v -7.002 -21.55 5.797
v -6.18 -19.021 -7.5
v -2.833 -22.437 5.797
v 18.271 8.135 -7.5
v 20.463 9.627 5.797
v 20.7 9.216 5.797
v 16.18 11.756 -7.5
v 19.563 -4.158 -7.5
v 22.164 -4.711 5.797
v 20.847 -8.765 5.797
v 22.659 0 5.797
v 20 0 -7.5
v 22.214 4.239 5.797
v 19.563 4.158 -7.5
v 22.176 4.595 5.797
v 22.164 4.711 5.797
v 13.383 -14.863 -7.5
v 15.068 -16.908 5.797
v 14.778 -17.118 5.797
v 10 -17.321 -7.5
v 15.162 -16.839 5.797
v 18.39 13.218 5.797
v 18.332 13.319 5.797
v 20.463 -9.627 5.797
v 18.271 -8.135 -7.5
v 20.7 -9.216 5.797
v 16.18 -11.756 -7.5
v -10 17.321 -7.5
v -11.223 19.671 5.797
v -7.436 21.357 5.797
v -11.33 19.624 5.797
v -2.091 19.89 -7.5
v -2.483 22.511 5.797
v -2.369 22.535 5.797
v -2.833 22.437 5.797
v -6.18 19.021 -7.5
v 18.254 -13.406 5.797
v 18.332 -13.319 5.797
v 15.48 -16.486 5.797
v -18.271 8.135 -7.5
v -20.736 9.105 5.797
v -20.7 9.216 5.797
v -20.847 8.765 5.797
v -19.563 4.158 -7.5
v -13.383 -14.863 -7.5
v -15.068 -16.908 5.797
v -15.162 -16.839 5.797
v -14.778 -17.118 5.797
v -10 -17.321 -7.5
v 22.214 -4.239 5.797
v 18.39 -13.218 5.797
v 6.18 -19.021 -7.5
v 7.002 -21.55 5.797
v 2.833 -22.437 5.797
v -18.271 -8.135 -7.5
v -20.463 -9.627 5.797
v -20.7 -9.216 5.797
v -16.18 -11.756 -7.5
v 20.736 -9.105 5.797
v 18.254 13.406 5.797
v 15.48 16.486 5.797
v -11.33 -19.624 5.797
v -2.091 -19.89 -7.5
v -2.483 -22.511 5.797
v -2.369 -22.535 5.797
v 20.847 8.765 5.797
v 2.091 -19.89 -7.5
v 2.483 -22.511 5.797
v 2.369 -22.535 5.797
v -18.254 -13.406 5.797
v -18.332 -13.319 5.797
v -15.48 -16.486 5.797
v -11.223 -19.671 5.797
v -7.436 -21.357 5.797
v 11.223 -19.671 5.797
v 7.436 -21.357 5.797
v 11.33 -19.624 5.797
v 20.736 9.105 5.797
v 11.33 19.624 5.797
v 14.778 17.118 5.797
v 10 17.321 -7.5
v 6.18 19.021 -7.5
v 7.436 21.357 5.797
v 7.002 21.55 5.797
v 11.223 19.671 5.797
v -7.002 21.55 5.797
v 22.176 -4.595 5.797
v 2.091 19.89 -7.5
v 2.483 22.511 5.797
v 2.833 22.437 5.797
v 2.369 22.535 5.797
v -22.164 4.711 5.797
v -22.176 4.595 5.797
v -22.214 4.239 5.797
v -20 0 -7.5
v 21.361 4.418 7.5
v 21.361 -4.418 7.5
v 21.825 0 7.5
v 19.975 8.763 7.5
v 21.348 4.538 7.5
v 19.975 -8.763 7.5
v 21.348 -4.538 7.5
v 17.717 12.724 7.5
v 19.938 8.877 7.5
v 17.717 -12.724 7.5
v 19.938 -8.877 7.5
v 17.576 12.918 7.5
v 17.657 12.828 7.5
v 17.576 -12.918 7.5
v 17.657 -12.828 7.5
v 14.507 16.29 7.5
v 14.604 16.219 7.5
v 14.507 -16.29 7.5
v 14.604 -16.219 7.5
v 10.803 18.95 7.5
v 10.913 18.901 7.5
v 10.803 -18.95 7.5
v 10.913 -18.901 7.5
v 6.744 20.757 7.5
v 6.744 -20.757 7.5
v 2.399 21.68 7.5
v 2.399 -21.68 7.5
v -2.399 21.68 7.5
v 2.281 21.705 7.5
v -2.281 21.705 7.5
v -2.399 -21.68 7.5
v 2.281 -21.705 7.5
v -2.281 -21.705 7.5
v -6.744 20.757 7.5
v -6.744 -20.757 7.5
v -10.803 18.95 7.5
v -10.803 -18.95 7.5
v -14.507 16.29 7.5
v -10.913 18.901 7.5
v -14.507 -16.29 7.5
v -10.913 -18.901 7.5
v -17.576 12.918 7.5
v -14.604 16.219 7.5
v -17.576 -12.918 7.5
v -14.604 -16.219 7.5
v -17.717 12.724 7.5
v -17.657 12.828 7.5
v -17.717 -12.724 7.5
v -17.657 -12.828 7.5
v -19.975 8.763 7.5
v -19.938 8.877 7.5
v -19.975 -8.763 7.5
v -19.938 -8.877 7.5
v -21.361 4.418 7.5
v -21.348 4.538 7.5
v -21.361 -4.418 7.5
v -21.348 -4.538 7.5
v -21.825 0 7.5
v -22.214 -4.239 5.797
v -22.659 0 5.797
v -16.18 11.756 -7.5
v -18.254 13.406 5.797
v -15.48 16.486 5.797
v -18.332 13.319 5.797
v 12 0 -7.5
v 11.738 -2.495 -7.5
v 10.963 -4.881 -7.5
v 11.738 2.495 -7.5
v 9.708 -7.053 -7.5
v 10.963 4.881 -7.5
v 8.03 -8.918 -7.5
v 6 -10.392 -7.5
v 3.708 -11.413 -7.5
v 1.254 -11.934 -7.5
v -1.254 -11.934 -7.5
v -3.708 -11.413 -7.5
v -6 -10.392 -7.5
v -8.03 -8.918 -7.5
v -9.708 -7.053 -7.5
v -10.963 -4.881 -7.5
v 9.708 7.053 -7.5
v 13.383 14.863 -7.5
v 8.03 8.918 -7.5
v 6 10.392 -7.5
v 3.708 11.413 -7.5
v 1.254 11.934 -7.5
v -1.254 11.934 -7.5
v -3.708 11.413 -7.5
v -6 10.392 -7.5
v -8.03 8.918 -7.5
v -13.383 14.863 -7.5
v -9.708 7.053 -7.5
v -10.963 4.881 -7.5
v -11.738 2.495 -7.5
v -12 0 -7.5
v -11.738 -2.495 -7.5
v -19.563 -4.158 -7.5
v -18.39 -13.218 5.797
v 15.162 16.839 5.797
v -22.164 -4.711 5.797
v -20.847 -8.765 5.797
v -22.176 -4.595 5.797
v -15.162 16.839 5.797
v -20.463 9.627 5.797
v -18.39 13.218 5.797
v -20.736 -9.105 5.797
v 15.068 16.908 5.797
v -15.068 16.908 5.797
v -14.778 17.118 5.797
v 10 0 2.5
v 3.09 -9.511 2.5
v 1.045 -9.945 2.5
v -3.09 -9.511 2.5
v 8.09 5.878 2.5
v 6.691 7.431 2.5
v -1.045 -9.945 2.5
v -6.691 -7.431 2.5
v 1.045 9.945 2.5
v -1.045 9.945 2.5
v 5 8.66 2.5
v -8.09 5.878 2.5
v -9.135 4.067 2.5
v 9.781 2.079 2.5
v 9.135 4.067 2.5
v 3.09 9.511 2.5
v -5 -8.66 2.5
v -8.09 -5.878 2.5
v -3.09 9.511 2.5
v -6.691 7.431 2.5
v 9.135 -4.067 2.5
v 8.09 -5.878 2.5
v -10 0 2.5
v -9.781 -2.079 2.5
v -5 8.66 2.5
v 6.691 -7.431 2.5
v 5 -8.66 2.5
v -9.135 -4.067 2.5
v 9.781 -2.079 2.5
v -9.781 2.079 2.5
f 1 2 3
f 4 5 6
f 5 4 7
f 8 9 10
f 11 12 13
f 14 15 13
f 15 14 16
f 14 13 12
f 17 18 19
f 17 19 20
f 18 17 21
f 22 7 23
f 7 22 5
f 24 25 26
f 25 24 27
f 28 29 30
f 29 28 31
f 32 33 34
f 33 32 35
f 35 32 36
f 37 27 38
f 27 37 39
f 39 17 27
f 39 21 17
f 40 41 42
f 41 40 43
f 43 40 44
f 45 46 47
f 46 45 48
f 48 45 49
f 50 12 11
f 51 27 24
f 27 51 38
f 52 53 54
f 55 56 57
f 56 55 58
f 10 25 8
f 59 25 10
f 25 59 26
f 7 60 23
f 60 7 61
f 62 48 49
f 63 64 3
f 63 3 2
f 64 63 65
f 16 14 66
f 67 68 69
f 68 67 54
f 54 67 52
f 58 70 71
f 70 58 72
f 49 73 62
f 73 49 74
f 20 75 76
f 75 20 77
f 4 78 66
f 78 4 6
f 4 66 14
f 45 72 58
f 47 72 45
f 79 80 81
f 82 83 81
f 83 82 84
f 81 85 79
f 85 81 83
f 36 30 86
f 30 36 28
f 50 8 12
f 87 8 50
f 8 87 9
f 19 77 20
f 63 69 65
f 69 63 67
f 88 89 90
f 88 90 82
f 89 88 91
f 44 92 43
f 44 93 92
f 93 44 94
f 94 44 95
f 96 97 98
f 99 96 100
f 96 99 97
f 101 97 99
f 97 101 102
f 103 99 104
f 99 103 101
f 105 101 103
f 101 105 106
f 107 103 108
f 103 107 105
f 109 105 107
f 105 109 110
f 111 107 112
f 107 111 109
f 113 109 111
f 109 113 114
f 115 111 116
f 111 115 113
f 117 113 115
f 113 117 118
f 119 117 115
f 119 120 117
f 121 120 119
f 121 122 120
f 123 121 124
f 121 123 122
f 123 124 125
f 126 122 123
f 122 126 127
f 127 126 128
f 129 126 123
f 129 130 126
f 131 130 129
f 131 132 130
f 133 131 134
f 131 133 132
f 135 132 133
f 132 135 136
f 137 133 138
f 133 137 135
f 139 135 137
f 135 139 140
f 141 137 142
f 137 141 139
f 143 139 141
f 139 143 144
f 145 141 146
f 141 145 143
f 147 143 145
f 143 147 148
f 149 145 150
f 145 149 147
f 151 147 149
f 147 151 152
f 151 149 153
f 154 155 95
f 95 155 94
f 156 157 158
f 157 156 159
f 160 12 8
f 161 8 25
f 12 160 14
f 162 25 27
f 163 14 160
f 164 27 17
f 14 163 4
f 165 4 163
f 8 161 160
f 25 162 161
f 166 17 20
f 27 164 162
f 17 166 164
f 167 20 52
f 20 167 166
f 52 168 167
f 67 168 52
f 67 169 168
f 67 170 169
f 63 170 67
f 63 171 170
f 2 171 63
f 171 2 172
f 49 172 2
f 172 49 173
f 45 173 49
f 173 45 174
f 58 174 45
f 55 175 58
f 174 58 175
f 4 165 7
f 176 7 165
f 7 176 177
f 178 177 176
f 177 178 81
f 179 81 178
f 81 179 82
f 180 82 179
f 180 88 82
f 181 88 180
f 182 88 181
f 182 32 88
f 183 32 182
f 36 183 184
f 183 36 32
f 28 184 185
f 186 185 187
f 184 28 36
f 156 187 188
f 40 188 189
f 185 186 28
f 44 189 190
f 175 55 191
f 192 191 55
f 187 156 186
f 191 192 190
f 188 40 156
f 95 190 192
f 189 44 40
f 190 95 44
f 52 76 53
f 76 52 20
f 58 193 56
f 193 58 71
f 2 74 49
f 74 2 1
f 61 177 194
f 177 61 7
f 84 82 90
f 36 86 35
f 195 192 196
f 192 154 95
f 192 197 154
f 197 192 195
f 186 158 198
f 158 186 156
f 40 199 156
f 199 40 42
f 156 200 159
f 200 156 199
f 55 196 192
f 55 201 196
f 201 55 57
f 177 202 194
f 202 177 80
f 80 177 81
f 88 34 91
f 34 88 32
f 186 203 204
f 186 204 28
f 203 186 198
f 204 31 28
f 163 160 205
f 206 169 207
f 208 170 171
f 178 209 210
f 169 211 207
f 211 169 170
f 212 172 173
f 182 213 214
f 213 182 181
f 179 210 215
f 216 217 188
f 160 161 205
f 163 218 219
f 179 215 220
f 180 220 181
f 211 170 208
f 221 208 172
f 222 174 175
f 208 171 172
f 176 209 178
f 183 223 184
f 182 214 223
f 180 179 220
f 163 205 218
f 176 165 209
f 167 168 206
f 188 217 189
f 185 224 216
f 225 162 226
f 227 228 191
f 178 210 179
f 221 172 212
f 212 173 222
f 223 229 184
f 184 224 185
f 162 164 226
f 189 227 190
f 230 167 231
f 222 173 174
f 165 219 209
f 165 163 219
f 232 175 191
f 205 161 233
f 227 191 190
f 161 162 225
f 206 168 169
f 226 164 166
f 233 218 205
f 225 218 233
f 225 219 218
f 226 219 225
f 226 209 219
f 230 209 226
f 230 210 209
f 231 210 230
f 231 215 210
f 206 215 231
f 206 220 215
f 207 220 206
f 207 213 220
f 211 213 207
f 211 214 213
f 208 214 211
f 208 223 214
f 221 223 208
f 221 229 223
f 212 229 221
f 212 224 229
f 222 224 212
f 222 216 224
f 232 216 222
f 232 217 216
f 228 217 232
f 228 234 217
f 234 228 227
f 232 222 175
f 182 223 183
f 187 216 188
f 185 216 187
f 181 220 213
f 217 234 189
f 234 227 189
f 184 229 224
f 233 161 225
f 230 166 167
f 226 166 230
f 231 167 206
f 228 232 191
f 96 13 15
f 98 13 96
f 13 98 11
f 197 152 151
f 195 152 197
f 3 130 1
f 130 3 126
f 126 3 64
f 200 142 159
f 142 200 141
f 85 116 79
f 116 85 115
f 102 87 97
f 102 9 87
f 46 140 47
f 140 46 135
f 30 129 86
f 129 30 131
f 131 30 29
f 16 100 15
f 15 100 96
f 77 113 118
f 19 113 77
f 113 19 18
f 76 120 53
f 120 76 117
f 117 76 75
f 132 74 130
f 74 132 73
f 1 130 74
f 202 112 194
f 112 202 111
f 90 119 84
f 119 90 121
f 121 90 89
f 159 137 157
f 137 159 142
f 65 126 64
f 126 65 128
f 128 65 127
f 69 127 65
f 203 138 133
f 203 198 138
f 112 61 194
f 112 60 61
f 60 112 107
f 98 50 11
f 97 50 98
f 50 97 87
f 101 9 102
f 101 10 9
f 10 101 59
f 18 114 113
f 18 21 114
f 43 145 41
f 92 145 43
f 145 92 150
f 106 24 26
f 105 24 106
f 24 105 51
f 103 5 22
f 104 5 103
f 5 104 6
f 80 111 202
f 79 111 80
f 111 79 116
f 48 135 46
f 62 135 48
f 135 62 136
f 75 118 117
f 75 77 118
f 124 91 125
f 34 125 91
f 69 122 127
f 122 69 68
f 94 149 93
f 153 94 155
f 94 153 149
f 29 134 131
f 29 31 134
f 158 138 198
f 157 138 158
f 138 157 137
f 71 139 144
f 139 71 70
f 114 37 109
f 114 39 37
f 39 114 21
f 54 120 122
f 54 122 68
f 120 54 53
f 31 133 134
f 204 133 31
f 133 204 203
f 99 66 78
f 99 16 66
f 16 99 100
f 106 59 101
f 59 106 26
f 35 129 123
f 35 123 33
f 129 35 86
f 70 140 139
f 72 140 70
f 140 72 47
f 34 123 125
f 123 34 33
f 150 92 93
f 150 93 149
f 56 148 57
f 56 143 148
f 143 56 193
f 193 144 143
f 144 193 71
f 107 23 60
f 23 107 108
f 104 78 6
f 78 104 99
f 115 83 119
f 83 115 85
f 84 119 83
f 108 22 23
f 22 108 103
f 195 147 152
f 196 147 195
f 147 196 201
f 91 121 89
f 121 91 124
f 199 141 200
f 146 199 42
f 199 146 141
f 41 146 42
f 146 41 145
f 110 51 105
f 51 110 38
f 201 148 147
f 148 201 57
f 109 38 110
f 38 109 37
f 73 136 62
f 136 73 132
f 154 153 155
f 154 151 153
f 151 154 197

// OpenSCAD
// Leg endings for the Eyler-Werve couch

difference() {
	difference() {
		cylinder(r1=20,r2=23,h=15,center=true);
		translate([0,0,-2.5])
			cylinder(r1=12,r2=10,h=10,center=true);
	}
	difference() {
		cube([100,100,100],center=true);
		translate([0,0,-50])
			cylinder(r1=50,r2=1,h=100);
	}
}
